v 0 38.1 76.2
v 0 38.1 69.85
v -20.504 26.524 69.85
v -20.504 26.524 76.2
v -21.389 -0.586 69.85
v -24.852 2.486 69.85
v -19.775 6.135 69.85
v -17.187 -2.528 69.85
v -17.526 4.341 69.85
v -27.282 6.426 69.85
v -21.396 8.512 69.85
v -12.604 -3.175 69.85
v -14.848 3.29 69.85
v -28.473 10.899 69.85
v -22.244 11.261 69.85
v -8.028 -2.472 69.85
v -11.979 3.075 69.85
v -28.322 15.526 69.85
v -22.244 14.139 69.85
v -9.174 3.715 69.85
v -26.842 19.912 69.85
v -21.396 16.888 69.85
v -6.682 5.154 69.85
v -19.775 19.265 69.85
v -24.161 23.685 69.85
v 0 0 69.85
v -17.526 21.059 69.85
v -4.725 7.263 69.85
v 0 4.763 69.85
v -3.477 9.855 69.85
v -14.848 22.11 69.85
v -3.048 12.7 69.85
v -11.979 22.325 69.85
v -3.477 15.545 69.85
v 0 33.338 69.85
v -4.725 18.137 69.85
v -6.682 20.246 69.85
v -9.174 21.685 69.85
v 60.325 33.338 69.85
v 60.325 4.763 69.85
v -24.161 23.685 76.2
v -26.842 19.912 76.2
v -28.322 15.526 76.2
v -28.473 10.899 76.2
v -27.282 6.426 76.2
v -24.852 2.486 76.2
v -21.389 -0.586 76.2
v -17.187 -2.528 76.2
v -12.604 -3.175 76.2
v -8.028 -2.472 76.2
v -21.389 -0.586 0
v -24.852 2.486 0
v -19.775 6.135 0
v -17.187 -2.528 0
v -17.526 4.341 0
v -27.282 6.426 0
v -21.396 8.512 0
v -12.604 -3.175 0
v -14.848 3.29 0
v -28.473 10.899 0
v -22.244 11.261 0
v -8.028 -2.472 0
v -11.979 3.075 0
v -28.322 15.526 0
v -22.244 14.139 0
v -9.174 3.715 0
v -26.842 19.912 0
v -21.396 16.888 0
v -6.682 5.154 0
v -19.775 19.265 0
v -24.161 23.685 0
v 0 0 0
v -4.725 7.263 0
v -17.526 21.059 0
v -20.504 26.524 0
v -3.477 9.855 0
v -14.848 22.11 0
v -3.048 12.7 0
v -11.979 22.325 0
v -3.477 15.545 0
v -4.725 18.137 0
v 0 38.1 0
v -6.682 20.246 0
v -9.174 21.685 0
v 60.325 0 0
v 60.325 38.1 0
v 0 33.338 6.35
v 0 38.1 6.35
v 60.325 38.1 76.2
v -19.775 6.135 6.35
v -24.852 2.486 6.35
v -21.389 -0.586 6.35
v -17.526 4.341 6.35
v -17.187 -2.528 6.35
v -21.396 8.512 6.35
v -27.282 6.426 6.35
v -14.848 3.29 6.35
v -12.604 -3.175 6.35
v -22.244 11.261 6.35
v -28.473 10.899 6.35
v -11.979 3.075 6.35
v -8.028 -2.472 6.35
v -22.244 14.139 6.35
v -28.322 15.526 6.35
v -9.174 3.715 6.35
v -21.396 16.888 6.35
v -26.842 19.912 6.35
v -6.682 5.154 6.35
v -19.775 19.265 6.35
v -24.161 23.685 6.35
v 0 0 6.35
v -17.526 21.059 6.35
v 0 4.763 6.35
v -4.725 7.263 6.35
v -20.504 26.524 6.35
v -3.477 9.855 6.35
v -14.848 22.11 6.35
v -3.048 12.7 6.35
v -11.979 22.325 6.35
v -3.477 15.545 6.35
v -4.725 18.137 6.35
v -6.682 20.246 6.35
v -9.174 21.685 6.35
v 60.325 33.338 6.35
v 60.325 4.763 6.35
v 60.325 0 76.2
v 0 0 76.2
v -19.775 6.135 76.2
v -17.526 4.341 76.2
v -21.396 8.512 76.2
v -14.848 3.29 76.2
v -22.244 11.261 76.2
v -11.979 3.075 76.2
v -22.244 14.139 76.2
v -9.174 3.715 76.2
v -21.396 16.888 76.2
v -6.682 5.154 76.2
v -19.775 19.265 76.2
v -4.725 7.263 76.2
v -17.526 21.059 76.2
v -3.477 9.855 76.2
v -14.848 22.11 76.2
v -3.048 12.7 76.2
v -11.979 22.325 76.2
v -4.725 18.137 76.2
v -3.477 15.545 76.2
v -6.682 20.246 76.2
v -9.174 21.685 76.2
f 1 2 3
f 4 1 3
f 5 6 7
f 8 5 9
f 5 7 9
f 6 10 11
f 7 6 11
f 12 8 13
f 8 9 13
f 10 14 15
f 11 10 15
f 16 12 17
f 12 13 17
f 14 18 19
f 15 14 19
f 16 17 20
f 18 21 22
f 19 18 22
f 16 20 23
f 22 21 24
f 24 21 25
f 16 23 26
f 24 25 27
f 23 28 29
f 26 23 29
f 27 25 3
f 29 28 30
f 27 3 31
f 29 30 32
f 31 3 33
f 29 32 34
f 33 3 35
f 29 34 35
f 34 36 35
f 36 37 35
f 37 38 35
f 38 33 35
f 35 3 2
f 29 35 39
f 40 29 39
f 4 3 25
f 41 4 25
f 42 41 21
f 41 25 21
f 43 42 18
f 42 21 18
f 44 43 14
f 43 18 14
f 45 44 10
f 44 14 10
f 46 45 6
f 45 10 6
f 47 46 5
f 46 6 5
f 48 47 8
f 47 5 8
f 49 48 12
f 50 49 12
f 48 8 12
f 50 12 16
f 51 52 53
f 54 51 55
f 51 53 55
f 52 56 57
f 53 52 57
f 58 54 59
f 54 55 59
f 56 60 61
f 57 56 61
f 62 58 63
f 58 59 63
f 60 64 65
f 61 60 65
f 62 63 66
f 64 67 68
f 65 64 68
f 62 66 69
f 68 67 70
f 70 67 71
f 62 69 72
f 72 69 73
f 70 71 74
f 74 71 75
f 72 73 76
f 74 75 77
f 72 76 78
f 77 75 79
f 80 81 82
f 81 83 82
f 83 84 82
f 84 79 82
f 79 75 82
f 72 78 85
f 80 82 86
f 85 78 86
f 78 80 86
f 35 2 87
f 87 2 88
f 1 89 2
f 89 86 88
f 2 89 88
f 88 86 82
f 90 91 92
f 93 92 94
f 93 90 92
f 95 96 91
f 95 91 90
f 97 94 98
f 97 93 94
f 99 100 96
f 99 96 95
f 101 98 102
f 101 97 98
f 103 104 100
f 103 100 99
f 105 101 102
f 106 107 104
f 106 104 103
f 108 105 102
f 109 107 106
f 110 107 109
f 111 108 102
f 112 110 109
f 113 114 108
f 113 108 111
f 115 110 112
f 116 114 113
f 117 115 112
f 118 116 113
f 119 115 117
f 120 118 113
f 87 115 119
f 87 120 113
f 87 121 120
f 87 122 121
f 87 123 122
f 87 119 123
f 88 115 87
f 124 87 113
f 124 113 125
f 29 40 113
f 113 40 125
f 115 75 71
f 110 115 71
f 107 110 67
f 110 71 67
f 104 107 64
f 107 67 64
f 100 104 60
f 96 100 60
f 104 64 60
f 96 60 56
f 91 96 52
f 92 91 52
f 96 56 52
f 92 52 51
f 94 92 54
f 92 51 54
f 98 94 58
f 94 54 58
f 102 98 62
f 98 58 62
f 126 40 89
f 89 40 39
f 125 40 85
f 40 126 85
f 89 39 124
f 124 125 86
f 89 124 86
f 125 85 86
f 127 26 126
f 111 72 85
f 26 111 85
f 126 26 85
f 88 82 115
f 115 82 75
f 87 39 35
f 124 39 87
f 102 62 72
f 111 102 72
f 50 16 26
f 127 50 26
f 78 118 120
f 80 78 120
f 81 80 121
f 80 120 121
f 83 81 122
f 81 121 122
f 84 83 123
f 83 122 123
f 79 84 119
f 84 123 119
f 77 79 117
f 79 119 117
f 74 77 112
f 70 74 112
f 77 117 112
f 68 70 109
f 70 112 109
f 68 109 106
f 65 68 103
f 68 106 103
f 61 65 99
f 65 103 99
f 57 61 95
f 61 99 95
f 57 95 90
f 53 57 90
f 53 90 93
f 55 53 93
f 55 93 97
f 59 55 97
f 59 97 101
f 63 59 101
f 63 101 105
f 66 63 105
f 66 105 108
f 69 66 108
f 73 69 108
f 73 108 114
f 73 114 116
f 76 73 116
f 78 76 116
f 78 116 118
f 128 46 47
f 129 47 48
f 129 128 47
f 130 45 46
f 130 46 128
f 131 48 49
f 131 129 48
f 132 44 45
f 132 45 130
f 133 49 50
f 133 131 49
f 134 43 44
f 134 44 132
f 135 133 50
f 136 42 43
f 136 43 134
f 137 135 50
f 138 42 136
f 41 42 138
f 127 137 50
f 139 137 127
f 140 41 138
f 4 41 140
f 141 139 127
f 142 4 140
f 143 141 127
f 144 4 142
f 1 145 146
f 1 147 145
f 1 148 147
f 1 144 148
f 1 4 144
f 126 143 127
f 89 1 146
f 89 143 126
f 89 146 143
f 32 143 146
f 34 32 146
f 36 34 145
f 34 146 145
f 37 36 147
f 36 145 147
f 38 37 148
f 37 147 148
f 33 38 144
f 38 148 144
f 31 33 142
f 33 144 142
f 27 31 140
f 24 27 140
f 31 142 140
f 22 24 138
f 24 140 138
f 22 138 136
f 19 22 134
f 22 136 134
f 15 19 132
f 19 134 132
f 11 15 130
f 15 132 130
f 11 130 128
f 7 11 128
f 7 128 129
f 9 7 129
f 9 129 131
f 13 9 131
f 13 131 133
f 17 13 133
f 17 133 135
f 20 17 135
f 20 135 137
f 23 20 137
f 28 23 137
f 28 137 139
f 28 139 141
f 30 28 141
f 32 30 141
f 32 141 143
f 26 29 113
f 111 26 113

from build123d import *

# Parameters (mm, degrees)
MASS_DEPTH                = 76.2
SKETCH17_W                = 63.5
SKETCH17_H                = 28.575
HOLLOW1_DEPTH             = 124.131068378
SKETCH19_W                = 50.8
SKETCH19_H                = 63.5
HOLLOW2_DEPTH             = 106.589636092
SKETCH20_R                = 9.652
HORIZ_BEARING_MOUNT_DEPTH = 105.389442115


with BuildPart() as part:
    # Sketch2 → Mass (new body)
    with BuildSketch(Plane.XY):
        with BuildLine():
            Line((0, 0), (60.325, 0))
            Line((60.325, 0), (60.325, 38.1))
            Line((60.325, 38.1), (0, 38.1))
            Line((0, 38.1), (-20.504465098, 26.524107549))
            ThreePointArc((-20.504465098, 26.524107549), (-27.282443066, 6.425609255), (-8.028287758, -2.472037758))
            Line((-8.028287758, -2.472037758), (0, 0))
        make_face()
    extrude(amount=MASS_DEPTH)

    # Sketch17 → Hollow1 (cut, through all)
    with BuildSketch(Plane(origin=(60.325, 0, 0), x_dir=(0, 0, -1), z_dir=(1, 0, 0))):
        with Locations((-38.1, 19.05)):
            Rectangle(SKETCH17_W, SKETCH17_H)
    extrude(amount=-HOLLOW1_DEPTH, mode=Mode.SUBTRACT)

    # Sketch19 → Hollow2 (cut, through all)
    with BuildSketch(Plane(origin=(0, 38.1, 0), x_dir=(1, 0, 0), z_dir=(0, 1, 0))):
        with Locations((-25.4, -38.1)):
            Rectangle(SKETCH19_W, SKETCH19_H)
    extrude(amount=-HOLLOW2_DEPTH, mode=Mode.SUBTRACT)

    # Sketch20 → Horiz. Bearing Mount (cut, through all)
    with BuildSketch(Plane.XY.offset(76.2)):
        with Locations((-12.7, 12.7)):
            Circle(SKETCH20_R)
    extrude(amount=-HORIZ_BEARING_MOUNT_DEPTH, mode=Mode.SUBTRACT)


solid = part.part
